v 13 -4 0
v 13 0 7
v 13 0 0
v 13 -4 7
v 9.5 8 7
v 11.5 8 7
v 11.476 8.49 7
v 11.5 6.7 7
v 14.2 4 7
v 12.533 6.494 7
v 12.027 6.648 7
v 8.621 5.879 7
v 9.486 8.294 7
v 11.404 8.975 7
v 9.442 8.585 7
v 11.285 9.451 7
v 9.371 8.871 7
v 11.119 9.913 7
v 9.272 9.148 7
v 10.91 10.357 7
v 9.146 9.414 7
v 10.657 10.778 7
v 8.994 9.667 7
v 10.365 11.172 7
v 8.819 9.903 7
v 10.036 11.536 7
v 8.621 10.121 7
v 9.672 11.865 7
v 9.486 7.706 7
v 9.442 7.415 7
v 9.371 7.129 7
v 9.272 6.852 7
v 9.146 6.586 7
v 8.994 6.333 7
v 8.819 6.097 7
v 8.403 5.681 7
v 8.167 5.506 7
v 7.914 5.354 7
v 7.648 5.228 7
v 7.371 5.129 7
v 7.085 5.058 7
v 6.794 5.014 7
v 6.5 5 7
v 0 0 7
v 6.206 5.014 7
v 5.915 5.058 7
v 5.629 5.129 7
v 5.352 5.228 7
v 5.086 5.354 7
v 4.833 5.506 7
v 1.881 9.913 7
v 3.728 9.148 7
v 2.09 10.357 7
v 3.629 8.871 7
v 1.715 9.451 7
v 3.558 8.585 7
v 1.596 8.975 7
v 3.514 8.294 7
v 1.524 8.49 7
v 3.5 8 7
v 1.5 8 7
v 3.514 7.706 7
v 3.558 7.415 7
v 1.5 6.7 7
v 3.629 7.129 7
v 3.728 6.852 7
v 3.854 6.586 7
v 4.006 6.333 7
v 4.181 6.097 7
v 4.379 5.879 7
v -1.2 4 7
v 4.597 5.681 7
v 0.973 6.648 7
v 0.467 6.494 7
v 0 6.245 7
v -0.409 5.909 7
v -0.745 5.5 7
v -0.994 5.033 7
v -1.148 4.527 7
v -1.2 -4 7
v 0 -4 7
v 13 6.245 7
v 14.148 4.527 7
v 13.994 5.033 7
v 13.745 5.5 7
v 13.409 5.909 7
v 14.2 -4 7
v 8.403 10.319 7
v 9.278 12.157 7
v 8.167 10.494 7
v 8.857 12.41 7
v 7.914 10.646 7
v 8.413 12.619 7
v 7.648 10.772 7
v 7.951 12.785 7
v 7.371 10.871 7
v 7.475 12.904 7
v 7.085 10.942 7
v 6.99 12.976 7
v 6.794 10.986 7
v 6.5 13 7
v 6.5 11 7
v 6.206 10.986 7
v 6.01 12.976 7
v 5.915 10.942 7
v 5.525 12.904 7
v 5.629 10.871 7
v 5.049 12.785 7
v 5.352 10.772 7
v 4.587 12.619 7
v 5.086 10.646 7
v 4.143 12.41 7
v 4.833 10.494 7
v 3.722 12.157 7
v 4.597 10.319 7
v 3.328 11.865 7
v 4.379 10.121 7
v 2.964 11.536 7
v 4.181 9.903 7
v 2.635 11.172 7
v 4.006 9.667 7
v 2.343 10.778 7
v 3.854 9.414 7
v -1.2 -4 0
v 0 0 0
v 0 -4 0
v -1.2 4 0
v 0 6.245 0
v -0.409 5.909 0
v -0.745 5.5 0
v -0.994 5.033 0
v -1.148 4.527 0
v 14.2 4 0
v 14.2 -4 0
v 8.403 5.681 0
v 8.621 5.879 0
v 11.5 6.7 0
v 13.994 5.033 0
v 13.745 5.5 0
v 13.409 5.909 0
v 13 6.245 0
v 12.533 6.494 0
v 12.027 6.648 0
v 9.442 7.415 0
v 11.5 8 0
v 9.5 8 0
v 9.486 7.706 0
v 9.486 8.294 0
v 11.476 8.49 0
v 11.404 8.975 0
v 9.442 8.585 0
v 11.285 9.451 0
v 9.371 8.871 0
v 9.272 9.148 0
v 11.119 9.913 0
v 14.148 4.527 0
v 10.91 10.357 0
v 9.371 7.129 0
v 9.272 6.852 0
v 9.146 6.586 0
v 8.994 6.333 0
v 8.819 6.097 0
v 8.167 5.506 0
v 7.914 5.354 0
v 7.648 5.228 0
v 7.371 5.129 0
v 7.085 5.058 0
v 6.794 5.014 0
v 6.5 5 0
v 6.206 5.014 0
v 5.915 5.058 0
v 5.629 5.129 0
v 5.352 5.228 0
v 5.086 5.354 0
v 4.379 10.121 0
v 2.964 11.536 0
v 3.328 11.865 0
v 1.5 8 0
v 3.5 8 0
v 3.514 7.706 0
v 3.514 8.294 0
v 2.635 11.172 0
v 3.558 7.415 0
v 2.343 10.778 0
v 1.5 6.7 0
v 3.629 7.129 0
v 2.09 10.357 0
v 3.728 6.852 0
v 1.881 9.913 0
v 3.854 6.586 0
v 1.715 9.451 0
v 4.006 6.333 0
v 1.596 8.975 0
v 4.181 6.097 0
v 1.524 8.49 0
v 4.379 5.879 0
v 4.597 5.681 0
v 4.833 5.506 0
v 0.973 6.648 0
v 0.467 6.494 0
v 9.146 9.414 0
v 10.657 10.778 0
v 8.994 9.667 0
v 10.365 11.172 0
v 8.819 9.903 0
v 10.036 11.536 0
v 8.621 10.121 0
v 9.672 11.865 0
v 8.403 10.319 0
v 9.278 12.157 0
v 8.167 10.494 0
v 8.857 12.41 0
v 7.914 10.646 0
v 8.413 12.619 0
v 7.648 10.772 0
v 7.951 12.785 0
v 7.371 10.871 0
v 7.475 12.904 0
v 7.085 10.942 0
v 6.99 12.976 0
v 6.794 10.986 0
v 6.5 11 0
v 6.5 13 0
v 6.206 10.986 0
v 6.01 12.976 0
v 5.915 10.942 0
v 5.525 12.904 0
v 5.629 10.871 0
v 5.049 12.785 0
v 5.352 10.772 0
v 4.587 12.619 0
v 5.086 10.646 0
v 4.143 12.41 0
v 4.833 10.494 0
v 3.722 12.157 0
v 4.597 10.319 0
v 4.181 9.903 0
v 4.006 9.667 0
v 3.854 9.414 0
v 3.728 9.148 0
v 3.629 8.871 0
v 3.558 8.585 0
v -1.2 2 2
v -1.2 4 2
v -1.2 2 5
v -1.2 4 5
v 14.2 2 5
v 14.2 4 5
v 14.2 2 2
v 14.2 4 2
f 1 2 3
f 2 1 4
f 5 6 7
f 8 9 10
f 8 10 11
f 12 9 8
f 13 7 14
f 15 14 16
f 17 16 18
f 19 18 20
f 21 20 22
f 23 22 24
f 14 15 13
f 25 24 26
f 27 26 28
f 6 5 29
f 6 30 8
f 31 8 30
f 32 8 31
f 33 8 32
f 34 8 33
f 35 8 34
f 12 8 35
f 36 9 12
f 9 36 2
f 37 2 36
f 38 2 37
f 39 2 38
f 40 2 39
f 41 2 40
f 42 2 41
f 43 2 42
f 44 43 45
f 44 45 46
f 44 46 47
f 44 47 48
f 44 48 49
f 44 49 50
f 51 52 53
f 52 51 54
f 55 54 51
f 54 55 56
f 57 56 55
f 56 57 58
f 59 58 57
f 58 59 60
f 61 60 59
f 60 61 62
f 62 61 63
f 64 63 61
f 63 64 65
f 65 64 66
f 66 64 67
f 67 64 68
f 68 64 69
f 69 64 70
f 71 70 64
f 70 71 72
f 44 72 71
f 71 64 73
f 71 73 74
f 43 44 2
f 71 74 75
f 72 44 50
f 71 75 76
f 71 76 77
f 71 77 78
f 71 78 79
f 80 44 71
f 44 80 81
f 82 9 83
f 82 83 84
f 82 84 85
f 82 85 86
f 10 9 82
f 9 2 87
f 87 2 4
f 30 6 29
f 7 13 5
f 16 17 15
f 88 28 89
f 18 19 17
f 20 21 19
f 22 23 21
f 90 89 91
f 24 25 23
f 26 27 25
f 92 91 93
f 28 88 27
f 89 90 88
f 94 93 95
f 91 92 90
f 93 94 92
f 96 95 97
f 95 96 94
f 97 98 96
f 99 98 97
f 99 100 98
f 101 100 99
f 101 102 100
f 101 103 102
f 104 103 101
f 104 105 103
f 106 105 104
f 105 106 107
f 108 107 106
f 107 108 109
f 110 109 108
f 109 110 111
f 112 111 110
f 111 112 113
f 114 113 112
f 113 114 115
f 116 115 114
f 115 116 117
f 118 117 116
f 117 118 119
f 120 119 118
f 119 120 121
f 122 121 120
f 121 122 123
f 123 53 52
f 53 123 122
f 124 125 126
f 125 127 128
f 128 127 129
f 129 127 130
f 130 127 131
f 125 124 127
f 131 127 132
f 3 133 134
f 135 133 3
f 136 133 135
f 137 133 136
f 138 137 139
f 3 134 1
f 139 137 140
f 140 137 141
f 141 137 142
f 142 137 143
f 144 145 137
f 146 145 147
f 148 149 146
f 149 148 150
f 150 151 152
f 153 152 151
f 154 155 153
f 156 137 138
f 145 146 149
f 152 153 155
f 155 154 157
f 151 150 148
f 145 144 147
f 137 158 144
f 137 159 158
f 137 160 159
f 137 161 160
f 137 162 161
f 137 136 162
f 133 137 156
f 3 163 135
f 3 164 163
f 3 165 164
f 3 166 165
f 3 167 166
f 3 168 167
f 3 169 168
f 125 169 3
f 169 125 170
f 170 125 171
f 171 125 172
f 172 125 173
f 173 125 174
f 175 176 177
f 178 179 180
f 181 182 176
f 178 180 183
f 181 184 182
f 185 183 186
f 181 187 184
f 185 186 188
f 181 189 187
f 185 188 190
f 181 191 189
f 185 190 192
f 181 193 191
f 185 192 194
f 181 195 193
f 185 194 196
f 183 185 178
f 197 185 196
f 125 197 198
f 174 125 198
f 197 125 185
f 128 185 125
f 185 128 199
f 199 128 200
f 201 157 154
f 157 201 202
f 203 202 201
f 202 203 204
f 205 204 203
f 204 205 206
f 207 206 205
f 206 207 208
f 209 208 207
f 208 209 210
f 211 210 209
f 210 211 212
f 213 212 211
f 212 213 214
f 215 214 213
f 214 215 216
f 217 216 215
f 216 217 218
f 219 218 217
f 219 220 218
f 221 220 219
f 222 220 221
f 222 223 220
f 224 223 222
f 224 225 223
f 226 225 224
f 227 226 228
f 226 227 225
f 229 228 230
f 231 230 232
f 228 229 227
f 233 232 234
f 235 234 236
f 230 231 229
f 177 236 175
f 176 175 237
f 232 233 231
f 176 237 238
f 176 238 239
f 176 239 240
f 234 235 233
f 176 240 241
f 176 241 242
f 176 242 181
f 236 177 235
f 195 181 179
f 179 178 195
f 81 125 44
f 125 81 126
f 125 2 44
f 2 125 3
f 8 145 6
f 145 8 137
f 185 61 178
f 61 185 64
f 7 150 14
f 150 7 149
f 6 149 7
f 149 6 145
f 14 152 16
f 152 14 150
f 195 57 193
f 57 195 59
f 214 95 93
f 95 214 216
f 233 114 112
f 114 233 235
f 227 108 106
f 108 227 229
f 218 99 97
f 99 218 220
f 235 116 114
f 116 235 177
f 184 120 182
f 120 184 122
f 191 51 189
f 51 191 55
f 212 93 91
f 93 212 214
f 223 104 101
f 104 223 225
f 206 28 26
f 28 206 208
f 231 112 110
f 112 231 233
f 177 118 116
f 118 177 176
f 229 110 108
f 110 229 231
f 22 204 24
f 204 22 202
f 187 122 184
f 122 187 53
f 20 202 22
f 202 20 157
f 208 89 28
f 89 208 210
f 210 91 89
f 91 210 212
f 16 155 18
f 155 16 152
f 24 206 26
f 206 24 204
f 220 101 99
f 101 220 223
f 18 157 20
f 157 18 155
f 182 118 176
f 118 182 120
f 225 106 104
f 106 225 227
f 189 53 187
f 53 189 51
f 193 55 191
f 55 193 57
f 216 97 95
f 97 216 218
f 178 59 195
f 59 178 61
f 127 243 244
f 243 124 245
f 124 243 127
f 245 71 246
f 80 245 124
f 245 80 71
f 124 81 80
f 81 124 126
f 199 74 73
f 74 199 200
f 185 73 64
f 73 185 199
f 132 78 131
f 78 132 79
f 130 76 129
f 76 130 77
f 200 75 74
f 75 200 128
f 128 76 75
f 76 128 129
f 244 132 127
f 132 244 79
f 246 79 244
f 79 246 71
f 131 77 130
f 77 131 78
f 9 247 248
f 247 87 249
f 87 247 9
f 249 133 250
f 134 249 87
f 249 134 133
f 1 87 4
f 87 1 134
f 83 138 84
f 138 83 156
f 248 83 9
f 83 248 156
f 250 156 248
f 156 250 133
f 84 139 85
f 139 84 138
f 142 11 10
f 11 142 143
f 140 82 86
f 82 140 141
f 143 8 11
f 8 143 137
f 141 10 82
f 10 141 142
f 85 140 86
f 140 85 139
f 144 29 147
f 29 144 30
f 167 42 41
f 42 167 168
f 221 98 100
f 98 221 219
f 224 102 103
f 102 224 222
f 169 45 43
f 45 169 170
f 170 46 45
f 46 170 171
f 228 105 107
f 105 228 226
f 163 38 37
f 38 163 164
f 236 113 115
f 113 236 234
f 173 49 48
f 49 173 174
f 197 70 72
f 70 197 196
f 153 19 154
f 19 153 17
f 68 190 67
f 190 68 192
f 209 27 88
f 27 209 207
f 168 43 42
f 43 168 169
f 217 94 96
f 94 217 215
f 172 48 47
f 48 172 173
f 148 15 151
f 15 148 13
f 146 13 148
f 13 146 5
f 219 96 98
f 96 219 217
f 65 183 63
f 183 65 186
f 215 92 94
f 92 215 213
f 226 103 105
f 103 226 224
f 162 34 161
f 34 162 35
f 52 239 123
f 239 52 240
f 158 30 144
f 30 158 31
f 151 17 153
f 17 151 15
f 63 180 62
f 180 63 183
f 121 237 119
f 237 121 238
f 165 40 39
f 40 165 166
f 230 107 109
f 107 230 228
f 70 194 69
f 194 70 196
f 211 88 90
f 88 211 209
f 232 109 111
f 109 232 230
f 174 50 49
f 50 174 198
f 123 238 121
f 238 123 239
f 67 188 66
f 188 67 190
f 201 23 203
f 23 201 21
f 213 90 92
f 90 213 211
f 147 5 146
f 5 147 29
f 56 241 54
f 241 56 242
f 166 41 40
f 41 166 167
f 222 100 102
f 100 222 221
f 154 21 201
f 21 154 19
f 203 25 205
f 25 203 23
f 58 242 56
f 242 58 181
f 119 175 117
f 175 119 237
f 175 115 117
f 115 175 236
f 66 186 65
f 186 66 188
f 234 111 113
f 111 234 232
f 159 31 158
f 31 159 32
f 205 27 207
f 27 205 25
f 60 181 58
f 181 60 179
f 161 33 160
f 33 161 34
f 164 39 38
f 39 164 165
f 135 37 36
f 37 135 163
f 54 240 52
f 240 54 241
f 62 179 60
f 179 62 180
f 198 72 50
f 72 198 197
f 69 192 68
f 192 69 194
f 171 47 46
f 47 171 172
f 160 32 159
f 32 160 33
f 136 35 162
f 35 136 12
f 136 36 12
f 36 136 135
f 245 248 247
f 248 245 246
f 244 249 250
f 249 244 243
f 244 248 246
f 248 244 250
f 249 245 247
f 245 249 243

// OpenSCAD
// file: BrakeSensorHolderVars.scad
ringInnerDiameter=6;
ringOuterDiameter=10;
ringHeight=2;

holderHeight=8;
brakeHandleWidth=13;
length=7;

letchHeight=8;
letchWidth=1.2;

zipTieWidth=3;
zipTieThickness=2;
zipTieHoleOffset=2;

cylinderHeadHeight=1.2;

innerCylinderDiameter=ringInnerDiameter-1.0;
ringHolderOffset=(brakeHandleWidth-ringOuterDiameter)/2;
// main file
include <BrakeSensorHolderVars.scad>

difference()
{
	union()
	{
		cube([brakeHandleWidth,letchHeight/2,length]);
		
		translate([ringHolderOffset,0,0])
		cube([ringOuterDiameter,holderHeight,length]);
		
		translate([brakeHandleWidth/2,holderHeight,0])
		cylinder(d=ringOuterDiameter,h=length,$fn=64);
		
		// Left letch
		translate([-letchWidth,-letchHeight/2,0])
		cube([letchWidth,letchHeight,length]);
		
		translate([ringHolderOffset,letchHeight/2,0])
		cylinder(d=2*(letchWidth+ringHolderOffset),h=length,$fn=32);
		
		// Right letch
		translate([brakeHandleWidth,-letchHeight/2,0])
		cube([letchWidth,letchHeight,length]);
		
		translate([brakeHandleWidth-ringHolderOffset,letchHeight/2,0])
		cylinder(d=2*(letchWidth+ringHolderOffset),h=length,$fn=32);
	}
	
	translate([brakeHandleWidth/2,holderHeight,-1])
	cylinder(d=ringInnerDiameter,h=length+2,$fn=64);
	
	translate([-letchWidth-1,zipTieHoleOffset,(length-zipTieWidth)/2])
	cube([2*letchWidth+brakeHandleWidth+2,zipTieThickness,zipTieWidth]);
}
